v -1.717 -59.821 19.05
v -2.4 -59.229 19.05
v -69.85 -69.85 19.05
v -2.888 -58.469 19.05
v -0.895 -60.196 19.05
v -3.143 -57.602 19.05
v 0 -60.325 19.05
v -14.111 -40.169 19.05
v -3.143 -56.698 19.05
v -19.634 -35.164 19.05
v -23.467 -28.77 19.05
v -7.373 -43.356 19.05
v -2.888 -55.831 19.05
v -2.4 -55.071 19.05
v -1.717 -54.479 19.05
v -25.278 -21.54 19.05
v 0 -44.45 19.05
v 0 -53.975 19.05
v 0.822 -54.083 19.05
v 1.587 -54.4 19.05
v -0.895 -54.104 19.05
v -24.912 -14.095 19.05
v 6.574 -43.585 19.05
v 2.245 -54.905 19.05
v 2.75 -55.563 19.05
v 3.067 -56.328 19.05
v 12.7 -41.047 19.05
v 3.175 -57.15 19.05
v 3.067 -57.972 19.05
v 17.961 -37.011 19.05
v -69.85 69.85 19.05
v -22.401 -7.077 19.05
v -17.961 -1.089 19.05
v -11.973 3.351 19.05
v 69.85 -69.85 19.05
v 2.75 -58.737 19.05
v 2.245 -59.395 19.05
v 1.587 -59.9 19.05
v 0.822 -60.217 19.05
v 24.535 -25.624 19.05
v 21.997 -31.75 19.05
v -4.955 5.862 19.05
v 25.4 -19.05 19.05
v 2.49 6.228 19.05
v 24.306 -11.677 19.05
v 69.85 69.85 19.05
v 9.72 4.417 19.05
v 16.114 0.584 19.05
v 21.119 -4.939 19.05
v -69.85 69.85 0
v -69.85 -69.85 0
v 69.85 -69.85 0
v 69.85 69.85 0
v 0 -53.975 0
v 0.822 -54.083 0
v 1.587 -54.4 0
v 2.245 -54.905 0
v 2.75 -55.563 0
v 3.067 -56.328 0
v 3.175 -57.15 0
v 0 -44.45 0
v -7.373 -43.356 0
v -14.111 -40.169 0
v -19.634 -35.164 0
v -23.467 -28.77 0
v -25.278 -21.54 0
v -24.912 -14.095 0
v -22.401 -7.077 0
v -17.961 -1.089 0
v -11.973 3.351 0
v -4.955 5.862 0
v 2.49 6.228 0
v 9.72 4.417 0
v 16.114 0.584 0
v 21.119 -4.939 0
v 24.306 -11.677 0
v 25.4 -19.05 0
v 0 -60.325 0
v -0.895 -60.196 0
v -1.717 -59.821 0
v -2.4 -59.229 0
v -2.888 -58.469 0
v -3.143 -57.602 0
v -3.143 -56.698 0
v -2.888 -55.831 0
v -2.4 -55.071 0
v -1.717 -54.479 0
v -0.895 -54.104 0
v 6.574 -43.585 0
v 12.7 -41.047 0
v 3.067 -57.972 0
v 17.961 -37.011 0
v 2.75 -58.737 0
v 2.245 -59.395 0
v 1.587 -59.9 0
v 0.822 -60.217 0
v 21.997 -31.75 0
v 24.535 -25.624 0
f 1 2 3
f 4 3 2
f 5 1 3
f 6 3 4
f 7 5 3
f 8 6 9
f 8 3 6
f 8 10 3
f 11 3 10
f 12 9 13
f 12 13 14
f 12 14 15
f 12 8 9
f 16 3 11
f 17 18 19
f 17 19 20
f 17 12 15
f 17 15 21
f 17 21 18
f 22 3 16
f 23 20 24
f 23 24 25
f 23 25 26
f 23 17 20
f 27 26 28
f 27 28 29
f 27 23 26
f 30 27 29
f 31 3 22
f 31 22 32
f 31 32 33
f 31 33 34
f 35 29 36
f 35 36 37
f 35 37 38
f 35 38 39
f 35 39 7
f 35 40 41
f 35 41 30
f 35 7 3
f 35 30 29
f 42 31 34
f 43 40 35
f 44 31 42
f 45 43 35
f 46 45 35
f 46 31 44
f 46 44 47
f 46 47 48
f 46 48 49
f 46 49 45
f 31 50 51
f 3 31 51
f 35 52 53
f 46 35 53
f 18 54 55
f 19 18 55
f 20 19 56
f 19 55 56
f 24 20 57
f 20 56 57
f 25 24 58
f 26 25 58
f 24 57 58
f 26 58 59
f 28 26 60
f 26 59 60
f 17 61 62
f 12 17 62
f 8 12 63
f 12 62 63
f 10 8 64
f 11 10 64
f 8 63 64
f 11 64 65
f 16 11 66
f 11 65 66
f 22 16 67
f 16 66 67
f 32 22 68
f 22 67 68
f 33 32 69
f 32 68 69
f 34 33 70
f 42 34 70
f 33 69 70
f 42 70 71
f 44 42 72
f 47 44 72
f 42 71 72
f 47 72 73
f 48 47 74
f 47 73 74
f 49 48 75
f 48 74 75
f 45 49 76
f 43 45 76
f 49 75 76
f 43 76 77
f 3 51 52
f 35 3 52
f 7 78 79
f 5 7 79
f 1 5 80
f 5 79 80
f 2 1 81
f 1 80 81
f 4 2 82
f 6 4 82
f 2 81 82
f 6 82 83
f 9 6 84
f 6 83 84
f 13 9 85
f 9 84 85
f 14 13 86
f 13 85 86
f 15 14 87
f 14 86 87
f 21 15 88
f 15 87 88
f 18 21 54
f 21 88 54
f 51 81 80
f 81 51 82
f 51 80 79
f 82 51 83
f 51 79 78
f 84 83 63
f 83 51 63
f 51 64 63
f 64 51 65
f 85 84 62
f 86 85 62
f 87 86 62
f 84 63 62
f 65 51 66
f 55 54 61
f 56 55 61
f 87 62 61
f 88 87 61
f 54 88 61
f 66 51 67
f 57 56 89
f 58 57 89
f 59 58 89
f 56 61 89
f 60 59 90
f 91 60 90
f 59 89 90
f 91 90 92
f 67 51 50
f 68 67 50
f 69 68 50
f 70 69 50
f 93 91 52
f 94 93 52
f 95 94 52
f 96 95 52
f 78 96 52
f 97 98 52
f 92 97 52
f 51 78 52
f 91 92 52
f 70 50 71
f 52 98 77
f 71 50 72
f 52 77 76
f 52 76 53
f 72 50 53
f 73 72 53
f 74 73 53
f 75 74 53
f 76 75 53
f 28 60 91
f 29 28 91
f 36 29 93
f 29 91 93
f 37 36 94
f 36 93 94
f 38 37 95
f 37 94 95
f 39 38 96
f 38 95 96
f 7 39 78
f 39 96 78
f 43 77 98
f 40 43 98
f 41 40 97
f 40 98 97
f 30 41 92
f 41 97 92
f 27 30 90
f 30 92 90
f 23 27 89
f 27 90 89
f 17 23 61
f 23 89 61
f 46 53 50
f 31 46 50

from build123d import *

# Parameters (mm, degrees)
F1_DEPTH = 19.05


with BuildPart() as f1:
    # F0 (on Top) → F1 (new body)
    with BuildSketch(Plane.XY):
        with BuildLine():
            ThreePointArc((25.4, -19.05), (-17.960512, -1.089488), (0, -44.45))
            ThreePointArc((0, -44.45), (17.960512, -37.010512), (25.4, -19.05))
        make_face()
        Polygon((-69.85, 69.85), (-69.85, -69.85), (0, -69.85), (69.85, -69.85), (69.85, 69.85), align=None)
        with BuildLine():
            ThreePointArc((3.175, -57.15), (2.245064, -59.395064), (0, -60.325))
            ThreePointArc((0, -60.325), (-3.175, -57.15), (0, -53.975))
            ThreePointArc((0, -53.975), (2.245064, -54.904936), (3.175, -57.15))
        make_face(mode=Mode.SUBTRACT)
        with BuildLine():
            ThreePointArc((25.4, -19.05), (17.960512, -37.010512), (0, -44.45))
            ThreePointArc((0, -44.45), (-17.960512, -1.089488), (25.4, -19.05))
        make_face(mode=Mode.SUBTRACT)
    extrude(amount=F1_DEPTH)


solid = f1.part
